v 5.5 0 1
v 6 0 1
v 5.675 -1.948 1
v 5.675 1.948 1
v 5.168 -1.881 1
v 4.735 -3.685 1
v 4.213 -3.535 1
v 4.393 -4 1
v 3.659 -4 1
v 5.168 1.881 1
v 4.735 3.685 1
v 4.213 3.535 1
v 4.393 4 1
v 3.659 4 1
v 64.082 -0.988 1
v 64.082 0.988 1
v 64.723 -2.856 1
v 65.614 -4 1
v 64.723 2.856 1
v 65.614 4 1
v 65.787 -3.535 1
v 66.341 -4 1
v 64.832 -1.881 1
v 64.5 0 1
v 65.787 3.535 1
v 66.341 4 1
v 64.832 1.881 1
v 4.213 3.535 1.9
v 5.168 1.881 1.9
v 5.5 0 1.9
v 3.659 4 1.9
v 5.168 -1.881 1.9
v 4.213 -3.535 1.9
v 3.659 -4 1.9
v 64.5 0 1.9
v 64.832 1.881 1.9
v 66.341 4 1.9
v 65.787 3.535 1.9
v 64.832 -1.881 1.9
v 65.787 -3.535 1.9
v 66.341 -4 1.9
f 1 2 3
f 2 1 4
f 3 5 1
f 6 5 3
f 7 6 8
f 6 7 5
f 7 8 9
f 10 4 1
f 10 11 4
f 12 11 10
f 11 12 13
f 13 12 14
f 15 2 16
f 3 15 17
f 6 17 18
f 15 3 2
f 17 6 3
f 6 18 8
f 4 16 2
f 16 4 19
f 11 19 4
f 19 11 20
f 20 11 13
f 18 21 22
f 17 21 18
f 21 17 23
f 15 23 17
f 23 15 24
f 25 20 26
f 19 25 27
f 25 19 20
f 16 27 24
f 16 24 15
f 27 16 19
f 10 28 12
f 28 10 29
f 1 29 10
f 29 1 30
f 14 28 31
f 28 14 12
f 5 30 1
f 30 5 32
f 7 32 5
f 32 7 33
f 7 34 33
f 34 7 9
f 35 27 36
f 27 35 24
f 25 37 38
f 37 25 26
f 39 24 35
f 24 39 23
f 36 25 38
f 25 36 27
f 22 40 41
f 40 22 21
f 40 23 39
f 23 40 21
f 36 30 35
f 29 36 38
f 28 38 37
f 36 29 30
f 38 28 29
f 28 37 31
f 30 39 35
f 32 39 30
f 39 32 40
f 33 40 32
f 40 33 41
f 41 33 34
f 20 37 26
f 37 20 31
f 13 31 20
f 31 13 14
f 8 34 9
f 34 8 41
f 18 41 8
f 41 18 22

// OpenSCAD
// placa longitudinal de union entre las dos bobinas
// Se hace primero la estructura sólida, y después se resta el cilindro longitudinal interior para crear el hueco para la tuerca de fijacióno
// La estructura sólida se hace superponiendo cilindros
Altura = 15;
Cilindro_hueco_h = 15;
Cilindro_hueco_d = 3;
Cilindro_interno_base_d = 5;
Cilindro_externo_1 = 1;
Cilindro_externo_2 = 3;
Husillo = 1;
Distancia_cilindros = 70;
Temp = -4;

difference() {

    translate([0, Temp, 1]){
    cube([70, 8, 0.9], center = false);
    };    
    //translate([0, Temp, 13]){
    //cube([70, 8, 0.9], center = false);
    //};

difference() {

    union() {
        
        
        cylinder(h = Altura, d = Cilindro_interno_base_d, center = false);
        
    
        cylinder(h = 1, d = 12, center = false);
        translate([0,0,1]){
            cylinder(h = 1, d = 11, center = false);
            };
        translate([0,0,2]){
            cylinder(h = 3, d = 12, center = false);
            };
            
            translate([0,0,10]){
                    cylinder(h = 3, d = 12, center = false);
                    translate([0,0,3]){
                        cylinder(h = 1, d = 11, center = false);
                            };
                    translate([0,0,4]){
                    cylinder(h = 1, d = 12, center = false);
                    };
            }           
    };
//cylinder(h = 15, d = 3, center = false);
    
};

translate([Distancia_cilindros,0,0]) {
difference() {

    union() {
        
        
        cylinder(h = 15, d = 5, center = false);
        
    
        cylinder(h = 1, d = 12, center = false);
        translate([0,0,1]){
            cylinder(h = 1, d = 11, center = false);
            };
        translate([0,0,2]){
            cylinder(h = 3, d = 12, center = false);
            };
            
            translate([0,0,10]){
                    cylinder(h = 3, d = 12, center = false);
                    translate([0,0,3]){
                        cylinder(h = 1, d = 11, center = false);
                            };
                    translate([0,0,4]){
                    cylinder(h = 1, d = 12, center = false);
                    };
            }           
    };
//cylinder(h = 15, d = 3, center = false);
    
};
};
};






   


    
